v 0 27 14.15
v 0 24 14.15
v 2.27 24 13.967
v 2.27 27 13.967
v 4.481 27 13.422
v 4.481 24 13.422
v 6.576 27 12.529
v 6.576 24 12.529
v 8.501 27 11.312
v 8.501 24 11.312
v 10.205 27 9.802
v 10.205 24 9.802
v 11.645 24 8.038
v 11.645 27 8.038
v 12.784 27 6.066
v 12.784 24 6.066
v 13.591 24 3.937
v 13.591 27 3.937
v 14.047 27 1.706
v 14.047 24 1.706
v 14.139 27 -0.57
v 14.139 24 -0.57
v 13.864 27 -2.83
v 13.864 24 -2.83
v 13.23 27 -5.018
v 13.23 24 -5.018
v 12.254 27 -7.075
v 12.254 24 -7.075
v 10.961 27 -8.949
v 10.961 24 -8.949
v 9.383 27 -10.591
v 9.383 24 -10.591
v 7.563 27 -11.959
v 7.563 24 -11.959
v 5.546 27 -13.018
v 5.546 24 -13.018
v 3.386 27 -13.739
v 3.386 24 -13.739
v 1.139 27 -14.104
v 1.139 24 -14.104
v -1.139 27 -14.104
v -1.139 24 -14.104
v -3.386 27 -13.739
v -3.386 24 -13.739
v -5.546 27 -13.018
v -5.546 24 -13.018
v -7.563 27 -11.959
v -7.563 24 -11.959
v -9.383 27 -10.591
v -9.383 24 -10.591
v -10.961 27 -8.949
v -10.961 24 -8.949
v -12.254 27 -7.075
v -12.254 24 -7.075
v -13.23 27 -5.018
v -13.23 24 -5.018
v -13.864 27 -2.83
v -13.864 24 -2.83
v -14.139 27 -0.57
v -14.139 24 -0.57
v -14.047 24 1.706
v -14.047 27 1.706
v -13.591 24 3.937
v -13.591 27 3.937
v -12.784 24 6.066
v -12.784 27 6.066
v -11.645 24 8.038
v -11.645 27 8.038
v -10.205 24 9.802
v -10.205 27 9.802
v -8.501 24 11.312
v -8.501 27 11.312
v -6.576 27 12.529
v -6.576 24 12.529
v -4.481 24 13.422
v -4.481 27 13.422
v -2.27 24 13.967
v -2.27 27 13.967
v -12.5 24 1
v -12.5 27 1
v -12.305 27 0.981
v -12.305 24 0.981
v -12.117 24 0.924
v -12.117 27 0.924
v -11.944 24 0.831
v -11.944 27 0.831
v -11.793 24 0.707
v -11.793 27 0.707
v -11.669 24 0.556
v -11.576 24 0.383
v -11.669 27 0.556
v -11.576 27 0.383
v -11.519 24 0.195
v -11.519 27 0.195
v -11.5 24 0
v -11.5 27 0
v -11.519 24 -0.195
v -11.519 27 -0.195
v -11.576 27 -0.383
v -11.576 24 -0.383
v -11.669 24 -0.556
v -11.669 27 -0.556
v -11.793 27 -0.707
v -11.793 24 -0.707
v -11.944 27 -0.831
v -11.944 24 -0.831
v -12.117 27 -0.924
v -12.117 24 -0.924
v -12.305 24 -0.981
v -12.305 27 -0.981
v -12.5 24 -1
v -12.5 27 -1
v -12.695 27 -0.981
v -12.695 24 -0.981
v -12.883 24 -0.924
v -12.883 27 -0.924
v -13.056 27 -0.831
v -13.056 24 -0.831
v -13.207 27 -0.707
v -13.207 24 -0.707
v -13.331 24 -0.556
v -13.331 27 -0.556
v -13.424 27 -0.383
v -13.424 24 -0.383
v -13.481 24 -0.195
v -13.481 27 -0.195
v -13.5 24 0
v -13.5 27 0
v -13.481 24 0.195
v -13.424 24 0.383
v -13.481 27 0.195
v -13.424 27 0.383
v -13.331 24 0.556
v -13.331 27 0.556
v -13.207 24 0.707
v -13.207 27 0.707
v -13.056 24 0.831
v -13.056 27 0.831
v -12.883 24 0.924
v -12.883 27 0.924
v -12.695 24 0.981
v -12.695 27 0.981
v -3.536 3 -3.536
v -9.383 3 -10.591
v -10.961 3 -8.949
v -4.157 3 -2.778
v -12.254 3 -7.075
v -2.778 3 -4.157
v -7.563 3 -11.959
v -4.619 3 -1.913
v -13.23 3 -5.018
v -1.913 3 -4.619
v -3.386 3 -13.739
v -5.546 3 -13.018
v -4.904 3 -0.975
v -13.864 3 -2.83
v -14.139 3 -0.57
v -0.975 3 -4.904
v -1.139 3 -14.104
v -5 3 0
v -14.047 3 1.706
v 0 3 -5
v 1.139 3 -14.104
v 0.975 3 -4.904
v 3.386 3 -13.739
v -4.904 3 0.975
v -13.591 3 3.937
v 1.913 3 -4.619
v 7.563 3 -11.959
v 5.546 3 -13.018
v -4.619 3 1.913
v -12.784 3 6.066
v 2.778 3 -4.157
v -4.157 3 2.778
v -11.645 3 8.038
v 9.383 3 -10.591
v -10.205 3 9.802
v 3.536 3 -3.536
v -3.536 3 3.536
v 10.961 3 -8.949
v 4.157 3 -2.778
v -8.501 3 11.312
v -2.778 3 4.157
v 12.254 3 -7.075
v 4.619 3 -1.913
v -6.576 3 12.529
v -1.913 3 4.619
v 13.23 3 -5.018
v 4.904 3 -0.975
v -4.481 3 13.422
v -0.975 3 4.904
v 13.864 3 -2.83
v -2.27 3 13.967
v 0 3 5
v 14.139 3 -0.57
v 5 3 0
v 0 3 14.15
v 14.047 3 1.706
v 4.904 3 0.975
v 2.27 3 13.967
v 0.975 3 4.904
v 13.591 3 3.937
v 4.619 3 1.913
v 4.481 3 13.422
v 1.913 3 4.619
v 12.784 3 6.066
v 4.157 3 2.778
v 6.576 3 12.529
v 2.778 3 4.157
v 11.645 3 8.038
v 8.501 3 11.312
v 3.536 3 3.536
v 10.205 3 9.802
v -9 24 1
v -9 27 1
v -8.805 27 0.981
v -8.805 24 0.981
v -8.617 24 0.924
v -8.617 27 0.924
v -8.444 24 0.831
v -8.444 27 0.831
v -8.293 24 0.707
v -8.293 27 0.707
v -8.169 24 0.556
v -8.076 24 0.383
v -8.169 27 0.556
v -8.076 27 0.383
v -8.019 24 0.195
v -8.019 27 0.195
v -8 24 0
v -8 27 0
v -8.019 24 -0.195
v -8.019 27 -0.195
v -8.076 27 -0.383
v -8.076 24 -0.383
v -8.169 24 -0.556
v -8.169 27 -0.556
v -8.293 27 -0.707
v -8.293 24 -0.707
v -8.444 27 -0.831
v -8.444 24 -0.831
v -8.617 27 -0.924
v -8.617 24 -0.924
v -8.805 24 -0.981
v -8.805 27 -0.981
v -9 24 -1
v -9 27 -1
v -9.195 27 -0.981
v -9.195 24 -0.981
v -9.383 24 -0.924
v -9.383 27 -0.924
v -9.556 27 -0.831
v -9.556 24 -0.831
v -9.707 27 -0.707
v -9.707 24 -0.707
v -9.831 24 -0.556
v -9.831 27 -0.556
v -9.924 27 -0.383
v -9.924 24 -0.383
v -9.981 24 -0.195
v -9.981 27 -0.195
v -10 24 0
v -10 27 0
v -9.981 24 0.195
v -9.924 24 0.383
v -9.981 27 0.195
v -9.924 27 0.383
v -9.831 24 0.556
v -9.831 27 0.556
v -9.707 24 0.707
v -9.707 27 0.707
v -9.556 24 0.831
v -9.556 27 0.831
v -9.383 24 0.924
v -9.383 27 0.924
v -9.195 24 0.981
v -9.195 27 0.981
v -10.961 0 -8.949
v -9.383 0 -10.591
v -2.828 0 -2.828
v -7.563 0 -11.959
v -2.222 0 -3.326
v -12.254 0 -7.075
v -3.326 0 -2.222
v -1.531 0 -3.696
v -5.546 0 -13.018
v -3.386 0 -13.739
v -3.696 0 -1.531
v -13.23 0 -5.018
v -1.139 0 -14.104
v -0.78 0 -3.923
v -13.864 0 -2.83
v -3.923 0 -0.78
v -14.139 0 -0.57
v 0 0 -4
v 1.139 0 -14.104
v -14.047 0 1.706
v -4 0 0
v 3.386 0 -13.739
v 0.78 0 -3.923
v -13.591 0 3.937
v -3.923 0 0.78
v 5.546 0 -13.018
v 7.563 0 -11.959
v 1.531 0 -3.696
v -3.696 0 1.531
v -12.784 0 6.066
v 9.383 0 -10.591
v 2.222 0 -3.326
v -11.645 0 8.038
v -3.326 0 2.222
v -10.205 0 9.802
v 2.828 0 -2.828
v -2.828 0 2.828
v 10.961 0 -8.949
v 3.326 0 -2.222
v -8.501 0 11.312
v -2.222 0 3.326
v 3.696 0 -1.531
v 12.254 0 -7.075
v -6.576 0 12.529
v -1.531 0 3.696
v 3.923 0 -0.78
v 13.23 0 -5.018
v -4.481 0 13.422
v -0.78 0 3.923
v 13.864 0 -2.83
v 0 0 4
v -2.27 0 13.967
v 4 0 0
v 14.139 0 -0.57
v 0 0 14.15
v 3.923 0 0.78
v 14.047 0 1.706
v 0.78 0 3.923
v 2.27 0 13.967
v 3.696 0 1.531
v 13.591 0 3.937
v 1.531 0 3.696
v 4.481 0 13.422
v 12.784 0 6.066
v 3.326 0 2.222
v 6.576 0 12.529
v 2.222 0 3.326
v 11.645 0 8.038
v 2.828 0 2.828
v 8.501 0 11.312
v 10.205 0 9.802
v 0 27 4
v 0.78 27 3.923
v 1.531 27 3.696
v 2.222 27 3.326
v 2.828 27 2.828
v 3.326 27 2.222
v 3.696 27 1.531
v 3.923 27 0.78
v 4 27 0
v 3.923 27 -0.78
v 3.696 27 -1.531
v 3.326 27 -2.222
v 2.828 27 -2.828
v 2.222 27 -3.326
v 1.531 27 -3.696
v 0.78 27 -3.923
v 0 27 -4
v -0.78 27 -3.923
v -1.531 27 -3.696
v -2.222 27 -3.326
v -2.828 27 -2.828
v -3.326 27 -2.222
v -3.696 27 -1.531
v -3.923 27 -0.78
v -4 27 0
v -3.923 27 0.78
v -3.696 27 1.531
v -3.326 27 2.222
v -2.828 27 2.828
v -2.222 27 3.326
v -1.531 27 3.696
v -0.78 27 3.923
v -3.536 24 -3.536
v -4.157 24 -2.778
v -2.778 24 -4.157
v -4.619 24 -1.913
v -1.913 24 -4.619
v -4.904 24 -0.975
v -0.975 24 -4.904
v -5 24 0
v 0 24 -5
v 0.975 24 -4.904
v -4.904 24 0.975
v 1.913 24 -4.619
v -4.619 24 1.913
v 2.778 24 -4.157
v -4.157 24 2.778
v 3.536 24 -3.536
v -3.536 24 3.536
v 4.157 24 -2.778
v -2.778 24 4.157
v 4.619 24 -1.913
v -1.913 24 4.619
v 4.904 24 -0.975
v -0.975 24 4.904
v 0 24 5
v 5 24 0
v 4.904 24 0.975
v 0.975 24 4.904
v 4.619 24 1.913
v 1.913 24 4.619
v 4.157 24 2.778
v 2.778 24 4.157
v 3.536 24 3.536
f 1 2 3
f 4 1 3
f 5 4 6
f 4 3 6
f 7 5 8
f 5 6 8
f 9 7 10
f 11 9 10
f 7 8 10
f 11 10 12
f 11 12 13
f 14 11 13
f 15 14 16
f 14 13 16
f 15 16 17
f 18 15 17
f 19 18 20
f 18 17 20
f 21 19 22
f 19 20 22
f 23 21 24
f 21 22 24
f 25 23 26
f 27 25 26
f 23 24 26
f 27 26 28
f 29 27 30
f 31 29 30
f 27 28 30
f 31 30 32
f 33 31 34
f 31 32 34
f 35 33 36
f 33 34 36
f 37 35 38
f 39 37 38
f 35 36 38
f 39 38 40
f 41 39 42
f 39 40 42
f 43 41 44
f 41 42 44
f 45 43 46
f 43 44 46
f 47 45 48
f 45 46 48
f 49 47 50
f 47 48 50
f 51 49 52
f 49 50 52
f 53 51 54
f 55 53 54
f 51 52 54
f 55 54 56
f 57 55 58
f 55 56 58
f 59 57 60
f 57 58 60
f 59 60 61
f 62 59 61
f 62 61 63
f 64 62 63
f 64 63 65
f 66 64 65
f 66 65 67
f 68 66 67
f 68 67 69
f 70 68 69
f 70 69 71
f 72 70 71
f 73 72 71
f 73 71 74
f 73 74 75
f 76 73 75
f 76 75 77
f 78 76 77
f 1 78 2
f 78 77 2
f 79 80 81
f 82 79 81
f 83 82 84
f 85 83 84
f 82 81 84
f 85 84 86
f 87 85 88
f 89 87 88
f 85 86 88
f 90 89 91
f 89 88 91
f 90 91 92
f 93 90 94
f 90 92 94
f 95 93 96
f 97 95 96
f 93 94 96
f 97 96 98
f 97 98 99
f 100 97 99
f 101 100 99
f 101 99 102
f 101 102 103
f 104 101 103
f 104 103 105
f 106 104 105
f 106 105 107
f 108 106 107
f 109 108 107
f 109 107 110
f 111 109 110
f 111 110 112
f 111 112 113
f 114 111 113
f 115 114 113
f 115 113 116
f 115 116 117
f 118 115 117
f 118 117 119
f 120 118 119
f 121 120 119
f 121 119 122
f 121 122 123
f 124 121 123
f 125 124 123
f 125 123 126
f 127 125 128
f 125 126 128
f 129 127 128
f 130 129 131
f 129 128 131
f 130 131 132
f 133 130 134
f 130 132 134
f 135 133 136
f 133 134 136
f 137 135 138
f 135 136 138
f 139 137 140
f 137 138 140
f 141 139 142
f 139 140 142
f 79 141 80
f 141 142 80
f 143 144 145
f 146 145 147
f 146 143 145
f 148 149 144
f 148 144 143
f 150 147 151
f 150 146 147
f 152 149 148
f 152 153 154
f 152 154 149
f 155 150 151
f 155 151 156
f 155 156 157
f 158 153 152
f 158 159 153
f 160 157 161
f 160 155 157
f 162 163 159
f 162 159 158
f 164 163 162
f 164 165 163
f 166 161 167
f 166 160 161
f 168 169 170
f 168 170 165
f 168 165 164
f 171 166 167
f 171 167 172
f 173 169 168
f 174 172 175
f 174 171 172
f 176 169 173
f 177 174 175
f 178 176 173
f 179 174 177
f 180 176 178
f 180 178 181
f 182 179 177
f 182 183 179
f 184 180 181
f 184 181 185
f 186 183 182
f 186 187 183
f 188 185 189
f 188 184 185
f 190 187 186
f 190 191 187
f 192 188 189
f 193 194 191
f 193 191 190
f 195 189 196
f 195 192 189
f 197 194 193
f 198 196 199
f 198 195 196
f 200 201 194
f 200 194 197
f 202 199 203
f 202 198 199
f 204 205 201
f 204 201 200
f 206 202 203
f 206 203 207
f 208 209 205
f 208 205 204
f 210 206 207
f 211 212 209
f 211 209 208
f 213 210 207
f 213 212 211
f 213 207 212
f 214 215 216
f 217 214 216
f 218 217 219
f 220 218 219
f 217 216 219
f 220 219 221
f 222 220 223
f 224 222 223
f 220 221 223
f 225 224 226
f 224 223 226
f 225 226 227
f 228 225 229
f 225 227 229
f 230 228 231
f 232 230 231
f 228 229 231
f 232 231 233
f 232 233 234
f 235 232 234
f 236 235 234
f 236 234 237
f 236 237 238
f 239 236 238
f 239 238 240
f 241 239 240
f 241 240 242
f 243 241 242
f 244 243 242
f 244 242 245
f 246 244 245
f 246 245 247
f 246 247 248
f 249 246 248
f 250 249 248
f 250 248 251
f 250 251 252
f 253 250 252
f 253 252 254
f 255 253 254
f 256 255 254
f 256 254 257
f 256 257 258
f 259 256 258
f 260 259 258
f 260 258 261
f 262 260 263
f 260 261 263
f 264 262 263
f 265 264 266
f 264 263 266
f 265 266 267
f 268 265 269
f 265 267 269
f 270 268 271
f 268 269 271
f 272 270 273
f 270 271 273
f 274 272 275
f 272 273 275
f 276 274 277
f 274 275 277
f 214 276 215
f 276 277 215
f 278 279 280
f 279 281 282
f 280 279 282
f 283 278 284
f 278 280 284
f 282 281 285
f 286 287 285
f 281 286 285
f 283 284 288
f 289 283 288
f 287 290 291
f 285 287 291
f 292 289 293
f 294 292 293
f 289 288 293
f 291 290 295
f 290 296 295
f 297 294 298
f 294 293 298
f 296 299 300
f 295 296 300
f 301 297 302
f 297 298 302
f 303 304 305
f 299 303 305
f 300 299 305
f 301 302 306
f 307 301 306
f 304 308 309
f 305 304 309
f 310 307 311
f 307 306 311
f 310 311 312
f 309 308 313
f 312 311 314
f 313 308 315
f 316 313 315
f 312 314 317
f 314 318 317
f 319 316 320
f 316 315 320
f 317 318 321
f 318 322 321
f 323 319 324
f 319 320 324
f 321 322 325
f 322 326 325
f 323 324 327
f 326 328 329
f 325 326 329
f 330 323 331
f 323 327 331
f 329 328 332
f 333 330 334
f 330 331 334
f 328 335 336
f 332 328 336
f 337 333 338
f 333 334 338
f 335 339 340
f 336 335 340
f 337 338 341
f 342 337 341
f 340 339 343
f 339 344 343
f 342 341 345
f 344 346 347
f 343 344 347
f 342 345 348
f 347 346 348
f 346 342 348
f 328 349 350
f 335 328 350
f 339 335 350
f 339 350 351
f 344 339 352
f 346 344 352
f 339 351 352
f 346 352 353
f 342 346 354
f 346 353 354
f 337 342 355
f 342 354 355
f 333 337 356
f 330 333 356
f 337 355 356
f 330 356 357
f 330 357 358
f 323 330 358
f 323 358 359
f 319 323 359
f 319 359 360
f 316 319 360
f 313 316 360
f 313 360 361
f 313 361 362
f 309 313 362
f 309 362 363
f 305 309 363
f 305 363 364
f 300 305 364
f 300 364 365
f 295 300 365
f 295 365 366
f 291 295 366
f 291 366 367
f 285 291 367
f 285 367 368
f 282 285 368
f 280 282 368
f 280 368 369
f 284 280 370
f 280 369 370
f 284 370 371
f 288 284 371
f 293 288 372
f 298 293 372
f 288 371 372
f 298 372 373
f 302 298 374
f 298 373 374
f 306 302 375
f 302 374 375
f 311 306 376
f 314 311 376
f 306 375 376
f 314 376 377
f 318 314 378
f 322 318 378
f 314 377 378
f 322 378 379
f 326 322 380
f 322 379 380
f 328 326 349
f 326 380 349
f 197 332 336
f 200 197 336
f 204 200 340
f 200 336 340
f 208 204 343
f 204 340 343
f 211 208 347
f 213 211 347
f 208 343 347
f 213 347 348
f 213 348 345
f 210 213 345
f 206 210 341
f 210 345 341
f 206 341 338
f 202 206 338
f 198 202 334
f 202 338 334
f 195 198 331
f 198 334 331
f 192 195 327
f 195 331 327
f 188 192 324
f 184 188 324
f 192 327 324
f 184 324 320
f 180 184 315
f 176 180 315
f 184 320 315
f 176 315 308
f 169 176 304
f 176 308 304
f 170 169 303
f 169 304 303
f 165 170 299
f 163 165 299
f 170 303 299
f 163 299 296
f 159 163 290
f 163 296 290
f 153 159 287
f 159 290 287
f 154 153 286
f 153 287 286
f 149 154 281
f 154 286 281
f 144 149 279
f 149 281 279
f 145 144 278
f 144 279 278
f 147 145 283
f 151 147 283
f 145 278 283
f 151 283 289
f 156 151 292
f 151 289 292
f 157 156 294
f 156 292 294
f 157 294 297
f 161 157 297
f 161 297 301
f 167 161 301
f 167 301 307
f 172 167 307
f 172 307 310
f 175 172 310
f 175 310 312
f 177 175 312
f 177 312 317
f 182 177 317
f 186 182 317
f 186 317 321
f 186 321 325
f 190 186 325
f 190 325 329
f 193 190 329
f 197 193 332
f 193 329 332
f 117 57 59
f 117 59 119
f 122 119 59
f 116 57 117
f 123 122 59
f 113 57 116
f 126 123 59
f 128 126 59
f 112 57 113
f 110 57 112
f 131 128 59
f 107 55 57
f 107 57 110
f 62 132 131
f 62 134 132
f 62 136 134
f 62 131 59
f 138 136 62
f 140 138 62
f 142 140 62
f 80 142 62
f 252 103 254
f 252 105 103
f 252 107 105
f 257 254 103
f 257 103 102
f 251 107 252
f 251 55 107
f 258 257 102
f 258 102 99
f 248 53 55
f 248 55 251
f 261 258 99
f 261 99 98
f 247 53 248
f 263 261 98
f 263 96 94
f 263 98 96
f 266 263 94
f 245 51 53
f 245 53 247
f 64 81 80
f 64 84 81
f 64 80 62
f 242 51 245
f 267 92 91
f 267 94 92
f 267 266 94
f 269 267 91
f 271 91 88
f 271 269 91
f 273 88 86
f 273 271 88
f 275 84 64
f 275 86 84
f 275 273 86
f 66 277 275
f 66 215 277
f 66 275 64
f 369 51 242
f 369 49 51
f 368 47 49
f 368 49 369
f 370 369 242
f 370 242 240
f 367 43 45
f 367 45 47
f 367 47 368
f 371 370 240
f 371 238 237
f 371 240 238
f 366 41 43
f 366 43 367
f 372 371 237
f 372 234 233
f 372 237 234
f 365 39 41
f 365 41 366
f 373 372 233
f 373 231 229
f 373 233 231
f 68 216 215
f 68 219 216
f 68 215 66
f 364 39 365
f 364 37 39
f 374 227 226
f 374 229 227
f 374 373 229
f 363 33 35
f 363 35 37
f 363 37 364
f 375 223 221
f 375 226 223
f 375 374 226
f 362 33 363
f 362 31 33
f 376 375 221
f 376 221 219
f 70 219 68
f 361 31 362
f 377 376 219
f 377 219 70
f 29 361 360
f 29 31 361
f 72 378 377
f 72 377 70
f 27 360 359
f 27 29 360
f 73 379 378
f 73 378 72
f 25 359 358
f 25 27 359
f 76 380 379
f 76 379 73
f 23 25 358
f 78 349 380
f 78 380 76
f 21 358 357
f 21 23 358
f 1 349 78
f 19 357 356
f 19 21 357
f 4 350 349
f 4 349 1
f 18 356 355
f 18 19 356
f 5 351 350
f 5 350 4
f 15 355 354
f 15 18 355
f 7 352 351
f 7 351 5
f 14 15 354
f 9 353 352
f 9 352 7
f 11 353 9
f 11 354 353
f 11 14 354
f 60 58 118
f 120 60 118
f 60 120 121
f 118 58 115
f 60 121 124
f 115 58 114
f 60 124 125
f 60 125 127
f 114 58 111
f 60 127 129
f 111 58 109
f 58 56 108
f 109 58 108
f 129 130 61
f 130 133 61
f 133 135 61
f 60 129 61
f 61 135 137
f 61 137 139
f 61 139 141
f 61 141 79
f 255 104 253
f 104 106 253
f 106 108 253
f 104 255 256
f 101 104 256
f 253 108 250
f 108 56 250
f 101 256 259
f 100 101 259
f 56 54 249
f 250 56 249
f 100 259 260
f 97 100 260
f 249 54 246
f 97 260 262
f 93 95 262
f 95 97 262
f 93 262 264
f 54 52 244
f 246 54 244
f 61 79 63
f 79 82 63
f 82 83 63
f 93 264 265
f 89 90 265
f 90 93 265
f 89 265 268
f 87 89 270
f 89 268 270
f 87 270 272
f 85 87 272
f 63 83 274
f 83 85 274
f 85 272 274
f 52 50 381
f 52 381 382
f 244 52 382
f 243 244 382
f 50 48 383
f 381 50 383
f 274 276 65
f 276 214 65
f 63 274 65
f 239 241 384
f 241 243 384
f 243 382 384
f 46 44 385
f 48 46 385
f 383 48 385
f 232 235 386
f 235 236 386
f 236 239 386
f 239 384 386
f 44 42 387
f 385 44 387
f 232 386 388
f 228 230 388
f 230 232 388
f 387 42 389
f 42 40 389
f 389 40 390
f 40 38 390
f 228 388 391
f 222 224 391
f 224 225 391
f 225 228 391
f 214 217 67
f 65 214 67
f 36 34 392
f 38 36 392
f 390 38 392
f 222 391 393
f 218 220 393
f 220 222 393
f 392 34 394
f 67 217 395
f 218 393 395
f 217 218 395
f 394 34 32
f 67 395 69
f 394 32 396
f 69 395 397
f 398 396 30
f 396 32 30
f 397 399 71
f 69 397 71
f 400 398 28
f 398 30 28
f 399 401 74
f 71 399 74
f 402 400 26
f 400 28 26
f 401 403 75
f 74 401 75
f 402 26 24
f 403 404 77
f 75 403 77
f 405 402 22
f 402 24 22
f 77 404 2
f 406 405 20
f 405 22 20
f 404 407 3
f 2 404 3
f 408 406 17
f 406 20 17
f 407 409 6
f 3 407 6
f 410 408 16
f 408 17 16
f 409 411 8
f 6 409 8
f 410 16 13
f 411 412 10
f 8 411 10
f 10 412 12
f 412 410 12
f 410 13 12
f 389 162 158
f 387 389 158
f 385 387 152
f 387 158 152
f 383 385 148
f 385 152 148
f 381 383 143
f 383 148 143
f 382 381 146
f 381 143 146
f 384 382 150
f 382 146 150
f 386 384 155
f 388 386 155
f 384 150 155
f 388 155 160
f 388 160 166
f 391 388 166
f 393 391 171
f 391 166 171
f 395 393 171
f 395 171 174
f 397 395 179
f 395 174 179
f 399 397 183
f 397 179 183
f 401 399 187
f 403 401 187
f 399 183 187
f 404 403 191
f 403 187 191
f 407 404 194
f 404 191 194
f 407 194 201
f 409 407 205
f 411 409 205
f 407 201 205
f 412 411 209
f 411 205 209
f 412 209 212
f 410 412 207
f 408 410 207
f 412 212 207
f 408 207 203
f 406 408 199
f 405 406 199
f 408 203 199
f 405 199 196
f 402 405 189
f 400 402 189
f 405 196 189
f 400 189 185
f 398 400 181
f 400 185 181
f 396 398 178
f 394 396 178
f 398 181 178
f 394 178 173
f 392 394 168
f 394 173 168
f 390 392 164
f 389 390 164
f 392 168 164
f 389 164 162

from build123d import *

# Parameters (mm, degrees)
SKETCH1_R           = 14.15
BOSS_EXTRUDE1_DEPTH = 3
SKETCH2_R           = 5
BOSS_EXTRUDE2_DEPTH = 21
SKETCH3_R           = 14.15
BOSS_EXTRUDE3_DEPTH = 3
SKETCH4_R           = 4
CUT_EXTRUDE1_DEPTH  = 34.607216487
CUT_EXTRUDE2_REACH  = 35.607
SKETCH5_R           = 1


with BuildPart() as part:
    # Sketch1 → Boss-Extrude1 (new body)
    with BuildSketch(Plane(origin=(0, 0, 0), x_dir=(1, 0, 0), z_dir=(0, 1, 0))):
        with Locations(Location((0, 0, 0), (0, 0, 270))):
            Circle(SKETCH1_R)
    extrude(amount=BOSS_EXTRUDE1_DEPTH)

    # Sketch2 → Boss-Extrude2 (add)
    with BuildSketch(Plane(origin=(0, 3, 0), x_dir=(1, 0, 0), z_dir=(0, 1, 0))):
        with Locations(Location((0, 0, 0), (0, 0, 90))):
            Circle(SKETCH2_R)
    extrude(amount=BOSS_EXTRUDE2_DEPTH)

    # Sketch3 → Boss-Extrude3 (add)
    with BuildSketch(Plane(origin=(0, 24, 0), x_dir=(1, 0, 0), z_dir=(0, 1, 0))):
        with Locations(Location((0, 0, 0), (0, 0, 270))):
            Circle(SKETCH3_R)
    extrude(amount=BOSS_EXTRUDE3_DEPTH)

    # Sketch4 → Cut-Extrude1 (cut, through all)
    with BuildSketch(Plane(origin=(0, 27, 0), x_dir=(1, 0, 0), z_dir=(0, 1, 0))):
        with Locations(Location((0, 0, 0), (0, 0, 270))):
            Circle(SKETCH4_R)
    extrude(amount=-CUT_EXTRUDE1_DEPTH, mode=Mode.SUBTRACT)

    # Sketch5 → Cut-Extrude2 (cut, up to next)
    with BuildSketch(Plane(origin=(0, 27, 0), x_dir=(1, 0, 0), z_dir=(0, 1, 0)), mode=Mode.PRIVATE) as cut_extrude2_sk1:
        with Locations(Location((-9, 0, 0), (0, 0, 270))):
            Circle(SKETCH5_R)
    cut_extrude2_tool1 = extrude(cut_extrude2_sk1.sketch, amount=-CUT_EXTRUDE2_REACH, mode=Mode.PRIVATE) & part.part
    # Sketch5 → Cut-Extrude2 (cut, up to next)
    with BuildSketch(Plane(origin=(0, 27, 0), x_dir=(1, 0, 0), z_dir=(0, 1, 0)), mode=Mode.PRIVATE) as cut_extrude2_sk2:
        with Locations(Location((-12.5, 0, 0), (0, 0, 270))):
            Circle(SKETCH5_R)
    cut_extrude2_tool2 = extrude(cut_extrude2_sk2.sketch, amount=-CUT_EXTRUDE2_REACH, mode=Mode.PRIVATE) & part.part
    add(cut_extrude2_tool1.solids().sort_by_distance((-9, 27, 0))[0], mode=Mode.SUBTRACT)
    add(cut_extrude2_tool2.solids().sort_by_distance((-12.5, 27, 0))[0], mode=Mode.SUBTRACT)


solid = part.part
